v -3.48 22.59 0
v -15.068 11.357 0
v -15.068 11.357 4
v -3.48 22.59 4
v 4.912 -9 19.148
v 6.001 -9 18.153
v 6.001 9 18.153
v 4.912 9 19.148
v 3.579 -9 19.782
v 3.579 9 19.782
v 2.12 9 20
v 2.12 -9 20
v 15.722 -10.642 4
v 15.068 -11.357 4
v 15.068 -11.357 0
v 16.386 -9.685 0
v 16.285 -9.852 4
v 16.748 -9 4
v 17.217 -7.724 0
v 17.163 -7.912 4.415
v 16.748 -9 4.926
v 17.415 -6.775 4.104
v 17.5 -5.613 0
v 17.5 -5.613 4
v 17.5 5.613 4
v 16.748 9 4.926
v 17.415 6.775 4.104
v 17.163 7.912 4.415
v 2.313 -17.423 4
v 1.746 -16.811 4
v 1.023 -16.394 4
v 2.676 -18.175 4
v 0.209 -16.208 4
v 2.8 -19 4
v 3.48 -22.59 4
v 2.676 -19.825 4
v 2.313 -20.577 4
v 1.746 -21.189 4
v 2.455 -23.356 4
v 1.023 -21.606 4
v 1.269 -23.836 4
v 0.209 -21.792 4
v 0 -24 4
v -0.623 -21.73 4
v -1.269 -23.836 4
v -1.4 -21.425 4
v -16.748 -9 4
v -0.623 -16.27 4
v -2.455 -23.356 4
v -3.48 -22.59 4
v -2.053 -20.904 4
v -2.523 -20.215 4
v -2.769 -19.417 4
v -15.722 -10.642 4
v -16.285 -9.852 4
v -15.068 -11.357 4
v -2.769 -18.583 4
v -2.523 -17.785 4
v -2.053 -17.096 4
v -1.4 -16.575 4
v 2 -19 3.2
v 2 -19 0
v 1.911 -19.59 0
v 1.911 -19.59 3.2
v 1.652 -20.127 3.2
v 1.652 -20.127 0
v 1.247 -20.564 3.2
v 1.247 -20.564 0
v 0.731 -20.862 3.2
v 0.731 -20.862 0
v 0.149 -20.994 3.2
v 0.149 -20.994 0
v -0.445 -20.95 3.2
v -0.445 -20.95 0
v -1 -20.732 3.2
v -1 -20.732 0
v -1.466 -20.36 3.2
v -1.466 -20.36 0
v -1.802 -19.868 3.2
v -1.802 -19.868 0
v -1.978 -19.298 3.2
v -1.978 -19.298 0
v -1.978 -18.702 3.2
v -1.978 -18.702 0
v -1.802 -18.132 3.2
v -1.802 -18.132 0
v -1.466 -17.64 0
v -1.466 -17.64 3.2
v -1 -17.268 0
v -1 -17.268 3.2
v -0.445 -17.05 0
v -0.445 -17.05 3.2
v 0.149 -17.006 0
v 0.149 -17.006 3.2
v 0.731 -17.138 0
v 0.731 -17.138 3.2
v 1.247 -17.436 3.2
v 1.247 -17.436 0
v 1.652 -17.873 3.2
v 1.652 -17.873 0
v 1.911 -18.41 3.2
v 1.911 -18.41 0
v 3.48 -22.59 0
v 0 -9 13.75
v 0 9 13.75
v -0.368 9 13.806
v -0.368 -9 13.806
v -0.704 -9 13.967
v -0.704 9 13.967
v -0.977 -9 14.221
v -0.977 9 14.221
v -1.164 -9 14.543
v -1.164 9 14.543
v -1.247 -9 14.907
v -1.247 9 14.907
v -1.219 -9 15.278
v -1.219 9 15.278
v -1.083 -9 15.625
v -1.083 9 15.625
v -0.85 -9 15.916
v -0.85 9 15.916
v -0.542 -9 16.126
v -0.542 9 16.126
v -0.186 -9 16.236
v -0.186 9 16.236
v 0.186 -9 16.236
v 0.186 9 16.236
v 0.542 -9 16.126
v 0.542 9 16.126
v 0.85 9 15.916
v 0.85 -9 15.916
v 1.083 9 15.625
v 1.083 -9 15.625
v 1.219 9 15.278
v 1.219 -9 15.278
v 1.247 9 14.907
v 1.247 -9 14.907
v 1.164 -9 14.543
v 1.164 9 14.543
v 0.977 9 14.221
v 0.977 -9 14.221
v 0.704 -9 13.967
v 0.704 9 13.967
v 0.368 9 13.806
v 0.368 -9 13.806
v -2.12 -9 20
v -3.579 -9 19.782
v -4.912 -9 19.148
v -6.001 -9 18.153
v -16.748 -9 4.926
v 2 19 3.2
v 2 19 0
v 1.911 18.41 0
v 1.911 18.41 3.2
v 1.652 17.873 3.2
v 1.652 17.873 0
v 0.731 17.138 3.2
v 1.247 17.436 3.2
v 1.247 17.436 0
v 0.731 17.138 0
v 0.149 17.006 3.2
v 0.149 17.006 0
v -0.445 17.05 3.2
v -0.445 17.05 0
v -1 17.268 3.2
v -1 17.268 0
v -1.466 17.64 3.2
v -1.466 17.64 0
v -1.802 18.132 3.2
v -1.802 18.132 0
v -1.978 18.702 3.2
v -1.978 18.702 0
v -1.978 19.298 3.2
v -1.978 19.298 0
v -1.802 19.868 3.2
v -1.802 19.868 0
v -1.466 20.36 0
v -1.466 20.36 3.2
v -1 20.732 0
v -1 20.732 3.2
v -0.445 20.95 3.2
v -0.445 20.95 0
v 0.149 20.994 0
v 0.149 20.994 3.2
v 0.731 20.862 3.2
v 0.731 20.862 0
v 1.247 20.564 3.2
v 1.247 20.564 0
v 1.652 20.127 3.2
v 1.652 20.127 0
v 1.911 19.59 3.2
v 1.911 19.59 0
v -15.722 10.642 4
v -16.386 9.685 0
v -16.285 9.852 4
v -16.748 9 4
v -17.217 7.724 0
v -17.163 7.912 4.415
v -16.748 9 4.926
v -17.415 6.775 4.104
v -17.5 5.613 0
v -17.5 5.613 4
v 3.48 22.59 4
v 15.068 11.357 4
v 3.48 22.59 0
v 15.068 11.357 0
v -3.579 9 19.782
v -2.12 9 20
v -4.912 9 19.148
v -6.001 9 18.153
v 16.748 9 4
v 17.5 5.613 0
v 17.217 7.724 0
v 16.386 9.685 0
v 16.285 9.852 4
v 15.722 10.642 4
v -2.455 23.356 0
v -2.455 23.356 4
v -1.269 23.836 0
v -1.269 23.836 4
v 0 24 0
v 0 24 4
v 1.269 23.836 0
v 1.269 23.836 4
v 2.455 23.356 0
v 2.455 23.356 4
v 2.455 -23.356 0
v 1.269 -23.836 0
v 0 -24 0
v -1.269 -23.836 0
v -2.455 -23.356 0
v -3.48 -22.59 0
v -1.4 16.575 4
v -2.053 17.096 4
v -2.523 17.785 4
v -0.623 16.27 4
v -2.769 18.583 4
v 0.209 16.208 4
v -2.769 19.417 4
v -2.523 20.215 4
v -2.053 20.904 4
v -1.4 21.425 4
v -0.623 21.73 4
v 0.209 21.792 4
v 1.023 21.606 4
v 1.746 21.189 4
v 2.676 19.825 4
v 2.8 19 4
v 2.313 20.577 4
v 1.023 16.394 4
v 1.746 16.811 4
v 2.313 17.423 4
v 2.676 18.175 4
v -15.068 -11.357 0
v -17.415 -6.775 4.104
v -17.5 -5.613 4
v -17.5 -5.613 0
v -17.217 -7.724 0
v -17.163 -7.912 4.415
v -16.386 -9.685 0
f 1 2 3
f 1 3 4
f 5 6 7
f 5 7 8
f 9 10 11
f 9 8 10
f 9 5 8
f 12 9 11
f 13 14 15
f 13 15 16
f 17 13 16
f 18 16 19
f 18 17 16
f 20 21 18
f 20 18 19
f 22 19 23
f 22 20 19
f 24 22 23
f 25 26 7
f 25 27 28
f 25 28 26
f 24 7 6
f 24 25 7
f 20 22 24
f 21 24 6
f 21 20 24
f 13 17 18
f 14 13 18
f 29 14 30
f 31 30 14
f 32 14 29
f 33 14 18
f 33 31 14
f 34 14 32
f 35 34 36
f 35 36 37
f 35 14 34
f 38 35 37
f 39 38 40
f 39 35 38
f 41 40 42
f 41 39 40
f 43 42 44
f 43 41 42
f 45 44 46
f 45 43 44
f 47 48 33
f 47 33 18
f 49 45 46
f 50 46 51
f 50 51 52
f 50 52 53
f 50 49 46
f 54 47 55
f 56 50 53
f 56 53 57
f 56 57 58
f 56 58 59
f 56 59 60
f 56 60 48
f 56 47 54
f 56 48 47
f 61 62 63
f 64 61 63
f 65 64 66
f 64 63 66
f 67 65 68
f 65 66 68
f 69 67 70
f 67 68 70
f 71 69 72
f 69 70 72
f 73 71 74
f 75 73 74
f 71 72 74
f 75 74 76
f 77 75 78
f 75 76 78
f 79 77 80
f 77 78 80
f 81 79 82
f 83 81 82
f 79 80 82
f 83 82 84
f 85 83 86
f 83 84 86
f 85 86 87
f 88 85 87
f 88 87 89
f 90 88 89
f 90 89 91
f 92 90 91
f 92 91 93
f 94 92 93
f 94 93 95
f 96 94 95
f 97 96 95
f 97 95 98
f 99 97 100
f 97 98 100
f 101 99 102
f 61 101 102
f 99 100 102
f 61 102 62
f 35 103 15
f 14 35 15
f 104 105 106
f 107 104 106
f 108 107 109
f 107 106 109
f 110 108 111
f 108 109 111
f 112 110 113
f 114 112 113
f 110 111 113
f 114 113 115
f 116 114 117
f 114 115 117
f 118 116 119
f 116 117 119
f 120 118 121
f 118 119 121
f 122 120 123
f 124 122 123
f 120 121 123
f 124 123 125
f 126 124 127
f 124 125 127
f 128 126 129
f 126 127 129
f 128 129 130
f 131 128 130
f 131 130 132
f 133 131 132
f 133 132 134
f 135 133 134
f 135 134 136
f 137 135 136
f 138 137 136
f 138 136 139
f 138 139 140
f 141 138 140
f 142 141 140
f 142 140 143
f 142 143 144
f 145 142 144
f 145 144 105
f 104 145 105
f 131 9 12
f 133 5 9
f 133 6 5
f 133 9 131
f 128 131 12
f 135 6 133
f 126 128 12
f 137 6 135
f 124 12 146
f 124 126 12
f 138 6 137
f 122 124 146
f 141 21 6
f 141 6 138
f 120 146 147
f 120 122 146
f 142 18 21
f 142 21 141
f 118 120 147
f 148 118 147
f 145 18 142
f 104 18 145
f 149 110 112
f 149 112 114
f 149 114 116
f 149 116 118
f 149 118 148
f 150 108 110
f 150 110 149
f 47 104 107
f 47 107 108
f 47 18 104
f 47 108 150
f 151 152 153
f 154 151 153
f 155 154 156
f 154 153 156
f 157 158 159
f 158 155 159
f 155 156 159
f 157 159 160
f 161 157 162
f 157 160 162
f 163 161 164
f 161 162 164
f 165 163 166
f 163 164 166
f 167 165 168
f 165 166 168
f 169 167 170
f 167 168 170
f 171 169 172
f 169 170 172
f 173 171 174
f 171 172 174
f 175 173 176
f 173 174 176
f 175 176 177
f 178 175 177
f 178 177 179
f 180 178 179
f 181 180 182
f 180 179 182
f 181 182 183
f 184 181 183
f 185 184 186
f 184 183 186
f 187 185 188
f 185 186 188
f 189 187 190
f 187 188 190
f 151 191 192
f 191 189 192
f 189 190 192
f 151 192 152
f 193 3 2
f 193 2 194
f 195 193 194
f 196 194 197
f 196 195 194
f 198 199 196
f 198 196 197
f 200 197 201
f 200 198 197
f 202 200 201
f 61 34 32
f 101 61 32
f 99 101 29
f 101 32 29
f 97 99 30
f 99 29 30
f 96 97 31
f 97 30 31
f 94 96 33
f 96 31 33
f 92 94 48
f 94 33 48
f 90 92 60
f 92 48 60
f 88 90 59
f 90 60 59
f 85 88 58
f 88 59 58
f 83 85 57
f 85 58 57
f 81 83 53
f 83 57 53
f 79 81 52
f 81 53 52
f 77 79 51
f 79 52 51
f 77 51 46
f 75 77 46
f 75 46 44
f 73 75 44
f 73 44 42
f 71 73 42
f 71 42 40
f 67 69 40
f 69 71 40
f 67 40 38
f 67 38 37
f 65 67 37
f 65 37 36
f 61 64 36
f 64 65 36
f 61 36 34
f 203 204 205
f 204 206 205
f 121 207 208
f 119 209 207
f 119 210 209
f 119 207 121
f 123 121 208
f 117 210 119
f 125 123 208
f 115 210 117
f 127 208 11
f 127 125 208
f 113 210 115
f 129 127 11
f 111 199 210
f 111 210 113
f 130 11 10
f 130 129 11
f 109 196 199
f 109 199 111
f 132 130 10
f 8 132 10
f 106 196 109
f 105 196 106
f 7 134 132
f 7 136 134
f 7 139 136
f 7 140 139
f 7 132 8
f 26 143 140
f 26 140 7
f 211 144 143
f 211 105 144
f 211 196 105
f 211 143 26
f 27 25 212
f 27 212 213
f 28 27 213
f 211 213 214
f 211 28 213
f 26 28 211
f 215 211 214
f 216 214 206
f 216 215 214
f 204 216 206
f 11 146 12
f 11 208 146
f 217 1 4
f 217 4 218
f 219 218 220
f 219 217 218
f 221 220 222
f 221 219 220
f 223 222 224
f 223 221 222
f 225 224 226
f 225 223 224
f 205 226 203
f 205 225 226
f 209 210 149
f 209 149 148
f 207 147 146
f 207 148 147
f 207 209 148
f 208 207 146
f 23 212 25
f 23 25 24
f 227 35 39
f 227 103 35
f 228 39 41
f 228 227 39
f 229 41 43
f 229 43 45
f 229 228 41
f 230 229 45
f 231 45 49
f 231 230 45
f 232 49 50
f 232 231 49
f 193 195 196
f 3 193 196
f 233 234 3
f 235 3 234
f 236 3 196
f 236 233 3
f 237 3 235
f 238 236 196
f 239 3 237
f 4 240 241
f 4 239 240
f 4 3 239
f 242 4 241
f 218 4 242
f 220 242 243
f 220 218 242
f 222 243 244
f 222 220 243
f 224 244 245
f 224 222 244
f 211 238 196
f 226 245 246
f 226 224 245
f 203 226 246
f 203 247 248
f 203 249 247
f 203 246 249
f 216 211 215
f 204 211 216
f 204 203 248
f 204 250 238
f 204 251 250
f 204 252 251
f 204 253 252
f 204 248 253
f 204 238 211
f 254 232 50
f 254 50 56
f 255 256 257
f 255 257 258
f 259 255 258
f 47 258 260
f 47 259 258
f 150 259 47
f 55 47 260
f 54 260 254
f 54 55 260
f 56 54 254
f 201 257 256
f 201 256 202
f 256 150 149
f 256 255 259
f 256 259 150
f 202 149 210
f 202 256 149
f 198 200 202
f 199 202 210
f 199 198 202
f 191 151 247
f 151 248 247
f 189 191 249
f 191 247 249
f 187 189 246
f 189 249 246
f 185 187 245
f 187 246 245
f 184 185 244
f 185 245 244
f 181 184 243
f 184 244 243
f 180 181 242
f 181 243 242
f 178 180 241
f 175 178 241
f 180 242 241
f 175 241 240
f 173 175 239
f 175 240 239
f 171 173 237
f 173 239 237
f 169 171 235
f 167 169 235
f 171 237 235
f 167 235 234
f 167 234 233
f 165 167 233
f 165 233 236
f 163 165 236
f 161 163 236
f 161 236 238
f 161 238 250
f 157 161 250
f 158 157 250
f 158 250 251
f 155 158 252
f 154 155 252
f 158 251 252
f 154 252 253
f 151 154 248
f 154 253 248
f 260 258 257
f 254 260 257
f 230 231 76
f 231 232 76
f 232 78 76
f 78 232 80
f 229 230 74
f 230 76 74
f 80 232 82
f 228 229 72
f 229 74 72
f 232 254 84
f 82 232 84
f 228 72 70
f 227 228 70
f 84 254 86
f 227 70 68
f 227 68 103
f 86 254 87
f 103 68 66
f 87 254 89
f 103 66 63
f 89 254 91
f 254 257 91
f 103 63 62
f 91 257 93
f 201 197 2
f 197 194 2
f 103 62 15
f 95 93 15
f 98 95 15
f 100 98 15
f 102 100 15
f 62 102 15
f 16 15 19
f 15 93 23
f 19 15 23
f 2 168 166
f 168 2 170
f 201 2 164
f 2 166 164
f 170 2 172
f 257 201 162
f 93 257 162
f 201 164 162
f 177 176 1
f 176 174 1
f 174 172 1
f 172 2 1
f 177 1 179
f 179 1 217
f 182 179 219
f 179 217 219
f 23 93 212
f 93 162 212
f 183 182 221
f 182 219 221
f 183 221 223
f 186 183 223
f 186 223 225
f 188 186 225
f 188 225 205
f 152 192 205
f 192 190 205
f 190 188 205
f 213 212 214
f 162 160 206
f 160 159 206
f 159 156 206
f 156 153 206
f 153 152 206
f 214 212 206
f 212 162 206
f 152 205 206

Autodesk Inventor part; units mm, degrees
ref_plane "YZ Plane" through (0, 0, 0) normal (1, 0, 0) x (0, 1, 0)
ref_plane "XZ Plane" through (0, 0, 0) normal (0, 1, 0) x (-1, 0, 0)
ref_plane "XY Plane" through (0, 0, 0) normal (0, 0, 1) x (1, 0, 0)
sketch "Sketch1" plane through (0, 0, 0) normal (0, 0, 1) x (1, 0, 0)
  line L0 (-17.5, 9) -> (17.5, 9)
  line L1 (17.5, 9) -> (17.5, -9)
  line L2 (17.5, -9) -> (-17.5, -9)
  line L3 (-17.5, -9) -> (-17.5, 9)
  circle A0 centre (0, 19) radius 5
  line L4 (-17.5, 9) -> (-3.4801, 22.5901)
  line L5 (17.5, 9) -> (3.4801, 22.5901)
  circle A1 centre (0, 19) radius 2
  point P0 (0, 0)
  dimension "d0" = 35
  dimension "d1" = 18
  dimension "d5" = 17.5
  dimension "d6" = 9
  dimension "d13" = 10
  dimension "d14" = 10
  dimension "d15" = 4
extrude "Extrusion1" add sketch "Sketch1" along normal blind 20 contours L0 L1 L2 L3
extrude "Extrusion3" add sketch "Sketch1" along normal blind 4 contours L4 A0 L5 L0 | A0
mirror "Mirror3" about plane through (0, 0, 0) normal (0, 1, 0) of "Extrusion3"
chamfer "Chamfer1" distance 13 distance2 16 1 edges at (17.5, 0, 20) measured on face at (5.8333, -3, 20)
chamfer "Chamfer2" distance 13 distance2 16 1 edges at (-17.5, 0, 20) measured on face at (-10.1667, 3, 20)
sketch "Sketch2" plane through (-17.5, -9, 4) normal (0, -1, 0) x (1, 0, 0)
  line L0 (0, 0) -> (13, 16) projected
  line L1 (0, 0) -> (35, 0) projected
  line L2 (22, 16) -> (35, 0) projected
  line L3 (13, 16) -> (22, 16) projected
  point P0 (17.5, -4)
  point P1 (17.5, 11)
  dimension "d24" = 35
  dimension "d25" = 17.5
  dimension "d26" = 5
hole "Hole1" at (0, -9, 15) direction (0, 1, 0) diameter 2.5 end through all
fillet "Fillet1" radius 5 2 edges at (-4.5, 0, 20) (4.5, 0, 20)
fillet "Fillet2" radius 8 4 edges at (-17.5, -9, 2) (-17.5, 9, 2) (17.5, -9, 2) (17.5, 9, 2)
chamfer "Chamfer3" distance 0.8 angle 45 2 edges at (-2, -19, 4) (-2, 19, 4)
equation "\"d5\" = 0.5 * d0"
equation "\"d6\" = 0.5 * d1"
equation "\"d25\" = 0.5 * d24"
properties part number "3DP_PLA_Measurement_Rail_Base" material "ABS Plastic"
